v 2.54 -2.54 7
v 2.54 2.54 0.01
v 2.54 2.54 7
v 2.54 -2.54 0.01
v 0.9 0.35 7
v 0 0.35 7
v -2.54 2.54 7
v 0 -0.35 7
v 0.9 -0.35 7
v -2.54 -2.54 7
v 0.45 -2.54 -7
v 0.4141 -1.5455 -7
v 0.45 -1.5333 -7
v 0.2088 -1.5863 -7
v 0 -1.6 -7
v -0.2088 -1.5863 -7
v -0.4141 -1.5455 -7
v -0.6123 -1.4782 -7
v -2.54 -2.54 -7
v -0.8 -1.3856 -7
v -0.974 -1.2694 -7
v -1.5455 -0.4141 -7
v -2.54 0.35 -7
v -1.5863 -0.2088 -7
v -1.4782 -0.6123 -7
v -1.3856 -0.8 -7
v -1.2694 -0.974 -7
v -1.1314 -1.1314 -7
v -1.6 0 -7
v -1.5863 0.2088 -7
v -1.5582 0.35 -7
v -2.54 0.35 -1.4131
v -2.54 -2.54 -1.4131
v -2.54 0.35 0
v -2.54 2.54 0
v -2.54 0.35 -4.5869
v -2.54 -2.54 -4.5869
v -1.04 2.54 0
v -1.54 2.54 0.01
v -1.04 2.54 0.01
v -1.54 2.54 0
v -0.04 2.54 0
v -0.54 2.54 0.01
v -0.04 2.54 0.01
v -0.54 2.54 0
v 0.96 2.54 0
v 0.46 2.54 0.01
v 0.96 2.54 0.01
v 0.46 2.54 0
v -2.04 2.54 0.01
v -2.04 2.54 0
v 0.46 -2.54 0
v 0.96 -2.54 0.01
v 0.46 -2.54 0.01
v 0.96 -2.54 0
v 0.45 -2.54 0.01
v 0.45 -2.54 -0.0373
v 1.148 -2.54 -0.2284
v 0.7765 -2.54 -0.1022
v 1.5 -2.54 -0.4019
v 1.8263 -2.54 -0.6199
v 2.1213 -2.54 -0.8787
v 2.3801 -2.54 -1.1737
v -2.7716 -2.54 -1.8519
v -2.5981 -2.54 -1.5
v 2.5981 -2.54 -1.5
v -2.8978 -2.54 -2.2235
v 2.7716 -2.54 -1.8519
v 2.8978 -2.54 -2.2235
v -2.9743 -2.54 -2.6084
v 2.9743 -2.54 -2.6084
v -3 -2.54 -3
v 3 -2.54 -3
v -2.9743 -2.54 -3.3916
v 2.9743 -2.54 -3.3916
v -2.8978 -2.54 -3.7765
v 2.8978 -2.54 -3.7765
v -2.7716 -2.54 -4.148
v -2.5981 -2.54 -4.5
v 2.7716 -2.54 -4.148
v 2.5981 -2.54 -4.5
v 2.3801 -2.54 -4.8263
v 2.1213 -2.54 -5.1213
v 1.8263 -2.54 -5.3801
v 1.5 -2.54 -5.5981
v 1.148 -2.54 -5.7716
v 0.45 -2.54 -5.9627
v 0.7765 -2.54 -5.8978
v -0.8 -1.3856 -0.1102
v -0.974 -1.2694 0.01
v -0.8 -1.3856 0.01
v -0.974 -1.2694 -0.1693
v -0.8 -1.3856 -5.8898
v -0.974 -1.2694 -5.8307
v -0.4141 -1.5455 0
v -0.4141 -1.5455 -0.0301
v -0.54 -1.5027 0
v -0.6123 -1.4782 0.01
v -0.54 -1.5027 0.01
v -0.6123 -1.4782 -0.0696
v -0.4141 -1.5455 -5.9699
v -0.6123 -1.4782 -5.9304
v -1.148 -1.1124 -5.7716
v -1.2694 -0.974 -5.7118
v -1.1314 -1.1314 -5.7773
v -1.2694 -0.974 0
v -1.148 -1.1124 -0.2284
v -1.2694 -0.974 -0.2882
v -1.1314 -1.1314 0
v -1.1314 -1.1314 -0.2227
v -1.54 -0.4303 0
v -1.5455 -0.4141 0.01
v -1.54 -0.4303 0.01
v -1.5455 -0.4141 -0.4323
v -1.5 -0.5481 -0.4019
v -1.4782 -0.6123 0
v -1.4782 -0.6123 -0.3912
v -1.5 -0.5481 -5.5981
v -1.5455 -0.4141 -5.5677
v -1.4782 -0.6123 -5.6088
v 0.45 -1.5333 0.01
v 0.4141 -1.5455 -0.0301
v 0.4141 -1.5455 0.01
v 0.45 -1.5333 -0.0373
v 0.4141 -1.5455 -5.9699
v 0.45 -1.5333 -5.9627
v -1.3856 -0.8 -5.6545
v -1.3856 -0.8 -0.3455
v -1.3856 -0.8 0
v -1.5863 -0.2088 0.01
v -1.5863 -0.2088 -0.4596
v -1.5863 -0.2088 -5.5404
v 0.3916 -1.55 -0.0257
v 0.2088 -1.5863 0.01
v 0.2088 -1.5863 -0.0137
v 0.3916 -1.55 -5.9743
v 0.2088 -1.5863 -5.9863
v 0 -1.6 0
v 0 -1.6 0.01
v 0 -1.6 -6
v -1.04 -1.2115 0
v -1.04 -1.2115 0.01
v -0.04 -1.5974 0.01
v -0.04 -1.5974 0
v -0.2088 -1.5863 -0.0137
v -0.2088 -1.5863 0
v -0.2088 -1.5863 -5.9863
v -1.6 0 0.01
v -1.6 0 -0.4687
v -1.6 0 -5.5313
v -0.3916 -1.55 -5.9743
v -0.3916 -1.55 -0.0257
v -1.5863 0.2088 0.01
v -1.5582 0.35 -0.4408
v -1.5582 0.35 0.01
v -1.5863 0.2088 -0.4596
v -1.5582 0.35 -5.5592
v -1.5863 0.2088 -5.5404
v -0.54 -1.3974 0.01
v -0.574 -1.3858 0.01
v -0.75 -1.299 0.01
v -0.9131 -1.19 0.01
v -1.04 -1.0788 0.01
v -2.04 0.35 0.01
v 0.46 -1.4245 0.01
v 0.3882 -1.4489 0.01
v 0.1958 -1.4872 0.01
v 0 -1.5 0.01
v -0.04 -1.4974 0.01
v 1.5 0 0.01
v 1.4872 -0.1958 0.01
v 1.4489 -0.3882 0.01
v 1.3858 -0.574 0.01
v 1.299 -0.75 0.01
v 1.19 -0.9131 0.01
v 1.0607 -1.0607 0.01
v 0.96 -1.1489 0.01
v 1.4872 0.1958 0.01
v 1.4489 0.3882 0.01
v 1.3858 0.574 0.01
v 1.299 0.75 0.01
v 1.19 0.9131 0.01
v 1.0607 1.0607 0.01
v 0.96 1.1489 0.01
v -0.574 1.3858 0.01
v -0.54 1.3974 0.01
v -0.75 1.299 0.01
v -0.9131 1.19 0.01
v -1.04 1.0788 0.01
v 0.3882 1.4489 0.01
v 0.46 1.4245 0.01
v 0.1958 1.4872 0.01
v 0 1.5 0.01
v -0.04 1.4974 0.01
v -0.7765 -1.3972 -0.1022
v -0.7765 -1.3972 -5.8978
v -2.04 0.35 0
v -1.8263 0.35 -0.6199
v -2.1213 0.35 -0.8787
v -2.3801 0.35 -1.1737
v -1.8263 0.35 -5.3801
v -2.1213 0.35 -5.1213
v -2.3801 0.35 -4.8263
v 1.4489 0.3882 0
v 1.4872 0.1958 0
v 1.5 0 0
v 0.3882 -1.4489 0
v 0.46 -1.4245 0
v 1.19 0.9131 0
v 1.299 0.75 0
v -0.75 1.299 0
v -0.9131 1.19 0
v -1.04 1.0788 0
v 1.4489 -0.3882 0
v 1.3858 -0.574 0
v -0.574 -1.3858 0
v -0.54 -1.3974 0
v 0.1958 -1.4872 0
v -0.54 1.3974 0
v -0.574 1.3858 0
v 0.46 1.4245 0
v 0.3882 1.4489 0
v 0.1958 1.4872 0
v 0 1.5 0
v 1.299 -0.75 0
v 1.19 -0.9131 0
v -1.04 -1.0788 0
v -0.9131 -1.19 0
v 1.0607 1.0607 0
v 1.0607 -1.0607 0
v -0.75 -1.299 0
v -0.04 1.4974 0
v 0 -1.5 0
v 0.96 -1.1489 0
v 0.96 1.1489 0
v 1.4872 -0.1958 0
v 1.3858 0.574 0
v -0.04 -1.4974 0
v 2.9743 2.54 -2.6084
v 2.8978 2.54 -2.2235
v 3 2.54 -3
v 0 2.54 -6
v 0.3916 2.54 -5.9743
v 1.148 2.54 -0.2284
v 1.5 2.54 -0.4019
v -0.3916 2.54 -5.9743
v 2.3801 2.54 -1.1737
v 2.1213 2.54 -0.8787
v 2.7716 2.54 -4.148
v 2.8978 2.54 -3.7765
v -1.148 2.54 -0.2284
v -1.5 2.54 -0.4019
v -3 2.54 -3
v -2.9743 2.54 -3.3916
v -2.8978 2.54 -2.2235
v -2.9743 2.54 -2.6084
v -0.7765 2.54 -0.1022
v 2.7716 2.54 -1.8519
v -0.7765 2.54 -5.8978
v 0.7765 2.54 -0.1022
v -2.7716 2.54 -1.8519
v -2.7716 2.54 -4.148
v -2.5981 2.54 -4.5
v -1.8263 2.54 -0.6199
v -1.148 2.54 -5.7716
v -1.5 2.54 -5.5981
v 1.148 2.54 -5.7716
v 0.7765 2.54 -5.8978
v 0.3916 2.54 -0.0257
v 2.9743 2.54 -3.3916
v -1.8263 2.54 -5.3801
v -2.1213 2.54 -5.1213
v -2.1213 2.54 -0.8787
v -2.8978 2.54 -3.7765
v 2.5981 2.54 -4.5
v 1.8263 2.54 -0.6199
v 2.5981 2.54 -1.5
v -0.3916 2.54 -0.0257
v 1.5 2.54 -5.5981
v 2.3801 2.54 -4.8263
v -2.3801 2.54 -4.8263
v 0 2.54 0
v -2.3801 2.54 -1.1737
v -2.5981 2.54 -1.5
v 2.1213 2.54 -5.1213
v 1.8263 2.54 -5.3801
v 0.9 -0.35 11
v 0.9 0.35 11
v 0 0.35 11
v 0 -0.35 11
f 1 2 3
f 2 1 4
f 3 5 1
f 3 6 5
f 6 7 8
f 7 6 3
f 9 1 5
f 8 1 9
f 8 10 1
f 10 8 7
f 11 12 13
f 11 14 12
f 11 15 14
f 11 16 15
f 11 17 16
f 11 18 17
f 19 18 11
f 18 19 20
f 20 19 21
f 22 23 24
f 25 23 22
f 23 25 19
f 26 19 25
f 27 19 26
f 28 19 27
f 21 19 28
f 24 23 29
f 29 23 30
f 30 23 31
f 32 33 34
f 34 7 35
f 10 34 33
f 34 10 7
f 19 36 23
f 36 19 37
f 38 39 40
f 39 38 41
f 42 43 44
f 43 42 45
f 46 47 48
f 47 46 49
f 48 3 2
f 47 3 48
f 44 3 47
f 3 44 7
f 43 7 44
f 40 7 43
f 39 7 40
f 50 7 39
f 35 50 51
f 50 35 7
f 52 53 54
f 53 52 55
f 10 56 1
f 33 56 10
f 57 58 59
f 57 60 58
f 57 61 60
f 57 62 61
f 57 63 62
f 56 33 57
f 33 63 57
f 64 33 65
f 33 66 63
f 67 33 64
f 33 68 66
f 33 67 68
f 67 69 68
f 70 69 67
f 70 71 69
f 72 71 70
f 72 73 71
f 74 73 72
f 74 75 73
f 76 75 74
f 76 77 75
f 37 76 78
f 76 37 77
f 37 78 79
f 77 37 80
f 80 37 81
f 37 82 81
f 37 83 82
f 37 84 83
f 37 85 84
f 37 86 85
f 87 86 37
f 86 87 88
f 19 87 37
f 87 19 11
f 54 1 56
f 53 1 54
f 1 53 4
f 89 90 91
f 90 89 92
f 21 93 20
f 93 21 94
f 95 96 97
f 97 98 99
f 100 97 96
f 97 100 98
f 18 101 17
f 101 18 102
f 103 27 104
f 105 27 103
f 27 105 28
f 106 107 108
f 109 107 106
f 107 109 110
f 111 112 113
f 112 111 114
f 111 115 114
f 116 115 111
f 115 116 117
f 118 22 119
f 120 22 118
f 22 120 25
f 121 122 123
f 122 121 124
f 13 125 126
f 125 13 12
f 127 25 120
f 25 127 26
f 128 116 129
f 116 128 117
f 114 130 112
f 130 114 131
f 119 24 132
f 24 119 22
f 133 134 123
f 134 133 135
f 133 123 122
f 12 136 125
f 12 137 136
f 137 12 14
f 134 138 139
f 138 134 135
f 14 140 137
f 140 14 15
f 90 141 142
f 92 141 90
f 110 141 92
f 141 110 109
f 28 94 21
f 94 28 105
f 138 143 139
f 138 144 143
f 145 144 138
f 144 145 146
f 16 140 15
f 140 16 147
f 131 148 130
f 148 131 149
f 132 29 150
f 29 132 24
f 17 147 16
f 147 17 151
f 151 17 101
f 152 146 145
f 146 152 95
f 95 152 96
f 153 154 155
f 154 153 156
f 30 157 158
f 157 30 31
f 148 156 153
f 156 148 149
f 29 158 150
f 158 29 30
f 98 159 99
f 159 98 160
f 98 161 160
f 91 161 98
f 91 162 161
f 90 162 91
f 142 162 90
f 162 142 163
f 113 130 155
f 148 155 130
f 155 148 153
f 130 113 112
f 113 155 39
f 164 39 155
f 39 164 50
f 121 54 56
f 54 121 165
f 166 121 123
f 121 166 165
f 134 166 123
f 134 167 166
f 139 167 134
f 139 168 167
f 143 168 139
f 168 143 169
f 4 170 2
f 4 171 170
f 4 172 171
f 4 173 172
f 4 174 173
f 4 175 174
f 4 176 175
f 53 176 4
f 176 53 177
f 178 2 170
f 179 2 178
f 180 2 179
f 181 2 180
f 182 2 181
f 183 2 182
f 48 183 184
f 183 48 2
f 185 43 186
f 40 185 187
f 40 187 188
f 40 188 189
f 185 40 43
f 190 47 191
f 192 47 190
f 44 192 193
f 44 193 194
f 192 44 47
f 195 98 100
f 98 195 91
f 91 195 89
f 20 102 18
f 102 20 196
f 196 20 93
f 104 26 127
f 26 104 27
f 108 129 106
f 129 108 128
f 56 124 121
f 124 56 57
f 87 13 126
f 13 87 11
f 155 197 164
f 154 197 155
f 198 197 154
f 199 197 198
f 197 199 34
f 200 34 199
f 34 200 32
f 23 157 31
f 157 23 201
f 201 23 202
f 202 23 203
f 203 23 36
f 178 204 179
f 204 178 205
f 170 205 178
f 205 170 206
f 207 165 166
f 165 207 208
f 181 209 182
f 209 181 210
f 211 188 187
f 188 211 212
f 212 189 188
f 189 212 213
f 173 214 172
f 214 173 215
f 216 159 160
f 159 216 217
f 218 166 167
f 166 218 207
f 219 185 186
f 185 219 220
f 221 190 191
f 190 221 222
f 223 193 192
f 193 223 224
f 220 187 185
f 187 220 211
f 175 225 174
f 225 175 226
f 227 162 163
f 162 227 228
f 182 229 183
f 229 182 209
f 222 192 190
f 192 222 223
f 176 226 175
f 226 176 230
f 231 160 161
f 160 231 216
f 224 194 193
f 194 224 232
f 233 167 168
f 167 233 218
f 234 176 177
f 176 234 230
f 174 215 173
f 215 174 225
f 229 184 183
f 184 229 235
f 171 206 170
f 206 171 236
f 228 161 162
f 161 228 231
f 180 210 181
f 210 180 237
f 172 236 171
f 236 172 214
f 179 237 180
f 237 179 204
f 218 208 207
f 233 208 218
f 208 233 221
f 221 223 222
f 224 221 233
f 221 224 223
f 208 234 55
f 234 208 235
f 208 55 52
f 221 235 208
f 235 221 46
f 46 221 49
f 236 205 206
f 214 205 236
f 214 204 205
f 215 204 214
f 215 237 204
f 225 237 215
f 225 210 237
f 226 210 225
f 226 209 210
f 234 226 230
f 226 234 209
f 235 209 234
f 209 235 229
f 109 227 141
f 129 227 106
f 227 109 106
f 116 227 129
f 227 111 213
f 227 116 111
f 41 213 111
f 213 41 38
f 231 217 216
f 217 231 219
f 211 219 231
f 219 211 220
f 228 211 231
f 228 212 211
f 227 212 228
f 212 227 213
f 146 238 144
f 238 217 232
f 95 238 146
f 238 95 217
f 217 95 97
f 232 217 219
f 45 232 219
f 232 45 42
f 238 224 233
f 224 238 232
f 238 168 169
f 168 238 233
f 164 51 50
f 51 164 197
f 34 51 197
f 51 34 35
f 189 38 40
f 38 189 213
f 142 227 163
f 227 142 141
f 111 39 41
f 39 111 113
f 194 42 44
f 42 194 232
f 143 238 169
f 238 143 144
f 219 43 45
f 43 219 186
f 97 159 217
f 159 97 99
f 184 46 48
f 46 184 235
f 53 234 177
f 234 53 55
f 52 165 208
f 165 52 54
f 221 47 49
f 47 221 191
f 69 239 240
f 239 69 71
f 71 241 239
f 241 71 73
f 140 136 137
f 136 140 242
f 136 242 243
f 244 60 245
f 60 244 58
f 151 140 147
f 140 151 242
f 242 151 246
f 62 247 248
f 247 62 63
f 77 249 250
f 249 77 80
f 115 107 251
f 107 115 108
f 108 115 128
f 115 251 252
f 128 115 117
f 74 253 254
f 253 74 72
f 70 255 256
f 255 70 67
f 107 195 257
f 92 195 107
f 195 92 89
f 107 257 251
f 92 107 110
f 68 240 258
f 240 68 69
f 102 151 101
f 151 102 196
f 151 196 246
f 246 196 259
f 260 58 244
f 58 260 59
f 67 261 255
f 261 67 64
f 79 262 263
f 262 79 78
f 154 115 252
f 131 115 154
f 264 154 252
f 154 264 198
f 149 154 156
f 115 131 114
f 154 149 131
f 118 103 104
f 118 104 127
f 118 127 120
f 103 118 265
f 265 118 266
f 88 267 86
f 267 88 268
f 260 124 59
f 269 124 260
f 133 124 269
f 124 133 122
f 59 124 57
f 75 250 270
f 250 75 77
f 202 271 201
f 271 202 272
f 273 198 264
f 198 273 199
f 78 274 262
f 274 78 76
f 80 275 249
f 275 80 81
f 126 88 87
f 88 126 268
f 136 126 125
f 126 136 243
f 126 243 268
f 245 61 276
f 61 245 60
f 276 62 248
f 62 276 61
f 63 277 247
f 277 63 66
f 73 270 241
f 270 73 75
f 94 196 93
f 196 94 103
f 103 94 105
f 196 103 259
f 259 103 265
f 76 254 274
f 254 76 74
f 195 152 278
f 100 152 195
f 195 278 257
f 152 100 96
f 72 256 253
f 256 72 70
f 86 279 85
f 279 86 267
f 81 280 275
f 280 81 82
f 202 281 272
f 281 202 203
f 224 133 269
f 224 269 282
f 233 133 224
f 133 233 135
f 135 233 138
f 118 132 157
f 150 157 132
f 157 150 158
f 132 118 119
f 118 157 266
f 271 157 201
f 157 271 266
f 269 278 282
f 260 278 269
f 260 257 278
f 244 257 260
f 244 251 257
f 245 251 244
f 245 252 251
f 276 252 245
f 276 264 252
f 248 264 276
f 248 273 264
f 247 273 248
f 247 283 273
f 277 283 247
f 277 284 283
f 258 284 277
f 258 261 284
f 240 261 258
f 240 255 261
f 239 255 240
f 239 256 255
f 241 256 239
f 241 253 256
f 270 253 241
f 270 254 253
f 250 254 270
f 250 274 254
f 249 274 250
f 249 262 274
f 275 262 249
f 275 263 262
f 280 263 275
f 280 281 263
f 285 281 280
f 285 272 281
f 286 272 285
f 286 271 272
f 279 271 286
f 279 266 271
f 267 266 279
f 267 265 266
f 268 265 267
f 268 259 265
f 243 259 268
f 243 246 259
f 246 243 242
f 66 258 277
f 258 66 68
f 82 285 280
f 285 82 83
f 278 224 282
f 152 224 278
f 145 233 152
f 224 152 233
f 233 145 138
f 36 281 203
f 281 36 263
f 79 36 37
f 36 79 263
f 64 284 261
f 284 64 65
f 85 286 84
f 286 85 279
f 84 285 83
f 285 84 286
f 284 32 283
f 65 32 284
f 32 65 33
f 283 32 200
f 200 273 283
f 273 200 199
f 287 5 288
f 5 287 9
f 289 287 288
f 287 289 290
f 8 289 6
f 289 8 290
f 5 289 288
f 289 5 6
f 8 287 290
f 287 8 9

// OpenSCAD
// DND-72 ultra-low-cost S5-R variant -- CAD evidence for the unit cell and the
// R=6 / 20-writer low-cost bank geometry.
//
// This is a SINGLE-COLUMN unit cell of the unchanged S5-R register mechanism,
// re-rendered for the low-cost variant's design point, plus the R=6 deep bank
// cross-section that the exhaustive cost scan selects as the cheapest
// requirement-preserving configuration (R6-W20-M2, $345.90 delivered,
// 29.987 s). Its job is to let the sourced analytic printability gate read the
// declared feature sizes and to let a real OpenSCAD render + mesh-validate that
// the cell + bank geometry is a closed solid at the 5.08 mm pitch.
//
// IMPORTANT: this variant does NOT change the mechanism. The DND-72 finding is
// that the S5-R FIXED BASE alone ($218.70 parts -> $253.69 delivered) exceeds
// the $250 purchased target, so no mechanism cost-engineering can reach the
// target under the unchanged mission requirements. The CAD here is the cell of
// the cheapest requirement-preserving point, kept identical to the promoted
// geometry because that geometry is already the minimum for the gates.
//
// The constants below are parsed by tools/validate/analytic_printability.py
// (via tools/lowcost_analytic_printability.py) and recomputed by s5r_ultra.py.
// Keep them in sync.
//
// EVIDENCE CLASS: CAD (this file + its STL render). Not a print, not a
// measurement. See 07-evidence-and-decisions/dnd72-low-cost-variant.md.
//
// Units: mm. Target process: Bambu X1C, PLA, 0.4 mm nozzle (tools/fdm-limits).

// ==== cell geometry (unchanged S5-R; the DND-59 re-profile) ================
PITCH = 5.08;
ROTOR_RADIUS = 1.5;
ROTOR_CORE_RADIUS = 1.0;
BASE = 2.0;
LEVELS = 5;
LEVEL_ANGLE = 360 / LEVELS;     // 72 deg

// printed drive pawl (vertical cantilever, load-bearing = 2 lines)
PAWL_T = 0.90;                  // thickness in X (pitch direction); 2 lines
PAWL_W = 0.70;                  // width in Y (row direction)
PAWL_LEN = 8.00;                // Z extent of the cantilever
PAWL_DEFLECT = 0.10;            // working deflection off the rack tooth

// keeper latch (DND-59 re-profile: 2 lines + hard compression shoulder)
KEEPER_T = 0.90;               // thickness in Y (2 lines; PASS)
KEEPER_W = 0.70;
KEEPER_LEN = 4.00;
KEEPER_OVER_CENTRE = 0.06;
KEEPER_GATE_STEP = 0.35;
KEEPER_SHOULDER_X = 0.50;

// shared drive bar with rack (DND-58: pitch 1.00 / tooth 0.50, sourced rod d=6)
RACK_TOOTH_PITCH = 1.00;
RACK_TOOTH_HEIGHT = 0.50;
BAR_D = 6.0;                    // sourced steel drive rod d=6
BAR_H = BAR_D;
BAR_W = PITCH;                  // one column of the real 80-wide bar

// housing
CELL_H = 7.0;
WALL = 0.90;
SLOT_CLEAR = 0.15;
ROTOR_BORE_CLEAR = 0.40;

// ---- DND-72 low-cost design point (the cheapest <30 s configuration) ------
ROWS_IN_BANK = 6;               // R=6 bank depth (no pitch penalty)
WRITERS = 20;                   // 20 writer solenoids over 480 cells/group
BANK_MOTORS = 2;                // 2 bank motors drive the shared rod

$fn = 48;
EPS = 0.01;

module rotor() {
    cylinder(r = ROTOR_RADIUS, h = BASE);
    translate([0, 0, BASE]) cylinder(r = ROTOR_CORE_RADIUS, h = CELL_H - BASE);
}

module pawl() {
    translate([0, -PAWL_W / 2, 0]) cube([PAWL_T, PAWL_W, PAWL_LEN]);
}

module keeper() {
    // keeper re-profiled into the ROW (Y) direction, beside the pawl (DND-59).
    // Gate noses and the shoulder are given a small overlap into the leaf so the
    // union is a single manifold on every OpenSCAD/CGAL version (coincident faces
    // are version-sensitive and can leave a non-manifold shell).
    KEEP_OVERLAP = 0.05;
    translate([0, PAWL_W + KEEPER_OVER_CENTRE, 0])
        cube([KEEPER_T, KEEPER_T, KEEPER_LEN]);
    for (k = [0:LEVELS - 1])
        translate([0, PAWL_W + KEEPER_OVER_CENTRE + KEEPER_T - KEEP_OVERLAP,
                   k * KEEPER_GATE_STEP])
            cube([KEEPER_T, 0.20 + KEEP_OVERLAP, 0.15]);
    // hard printed shoulder: pawl push-out taken in COMPRESSION
    translate([0, PAWL_W + KEEPER_OVER_CENTRE, -KEEPER_SHOULDER_X])
        cube([KEEPER_T, KEEPER_SHOULDER_X, KEEPER_SHOULDER_X + KEEP_OVERLAP]);
}

module drive_bar() {
    // sourced steel rod d=6, modelled round; rack teeth 1.00/0.50
    translate([0, 0, -BAR_H / 2]) rotate([90, 0, 0])
        cylinder(r = BAR_D / 2, h = BAR_W, center = true);
    for (t = [0:3])
        translate([-BAR_W / 2 + t * RACK_TOOTH_PITCH, -BAR_W / 2, 0])
            cube([RACK_TOOTH_HEIGHT, BAR_W, RACK_TOOTH_HEIGHT]);
}

module cell() {
    difference() {
        translate([-PITCH / 2, -PITCH / 2, -BAR_H - 1])
            cube([PITCH, PITCH, CELL_H + BAR_H + 1]);
        translate([0, 0, -BAR_H - 1 - EPS]) cylinder(r = ROTOR_RADIUS + 0.10,
                                                     h = CELL_H + 2 * EPS);
        translate([PAWL_T / 2, -PITCH / 2 - EPS, -BAR_H - 1 - EPS])
            cube([PITCH / 2, PITCH + 2 * EPS, CELL_H + 2 * EPS]);
        translate([-PITCH / 2 - EPS, PAWL_W / 2, -BAR_H - 1 - EPS])
            cube([PITCH + 2 * EPS, PITCH / 2, CELL_H + 2 * EPS]);
    }
}

module unit_cell_assembly() {
    cell();
    rotor();
    translate([0, 0, BASE + 1]) pawl();
    translate([0, 0, BASE + 1]) keeper();
    drive_bar();
}

// The R=6 bank cross-section: 6 rows of the cell share ONE racked drive rod.
// This is the geometry that lets 6 rows be written per bank pass with no pitch
// penalty (row pitch == column pitch == 5.08 mm). Rendered as a small 6-row
// witness to keep the CAD render bounded; the real bank is 80 columns wide.
module bank_cross_section() {
    for (r = [0:ROWS_IN_BANK - 1])
        translate([0, r * PITCH, 0]) unit_cell_assembly();
}

part = "assembly";

if (part == "assembly") {
    unit_cell_assembly();
} else if (part == "bank") {
    bank_cross_section();
} else if (part == "cell") {
    cell();
} else if (part == "pawl") {
    pawl();
} else if (part == "keeper") {
    keeper();
}
